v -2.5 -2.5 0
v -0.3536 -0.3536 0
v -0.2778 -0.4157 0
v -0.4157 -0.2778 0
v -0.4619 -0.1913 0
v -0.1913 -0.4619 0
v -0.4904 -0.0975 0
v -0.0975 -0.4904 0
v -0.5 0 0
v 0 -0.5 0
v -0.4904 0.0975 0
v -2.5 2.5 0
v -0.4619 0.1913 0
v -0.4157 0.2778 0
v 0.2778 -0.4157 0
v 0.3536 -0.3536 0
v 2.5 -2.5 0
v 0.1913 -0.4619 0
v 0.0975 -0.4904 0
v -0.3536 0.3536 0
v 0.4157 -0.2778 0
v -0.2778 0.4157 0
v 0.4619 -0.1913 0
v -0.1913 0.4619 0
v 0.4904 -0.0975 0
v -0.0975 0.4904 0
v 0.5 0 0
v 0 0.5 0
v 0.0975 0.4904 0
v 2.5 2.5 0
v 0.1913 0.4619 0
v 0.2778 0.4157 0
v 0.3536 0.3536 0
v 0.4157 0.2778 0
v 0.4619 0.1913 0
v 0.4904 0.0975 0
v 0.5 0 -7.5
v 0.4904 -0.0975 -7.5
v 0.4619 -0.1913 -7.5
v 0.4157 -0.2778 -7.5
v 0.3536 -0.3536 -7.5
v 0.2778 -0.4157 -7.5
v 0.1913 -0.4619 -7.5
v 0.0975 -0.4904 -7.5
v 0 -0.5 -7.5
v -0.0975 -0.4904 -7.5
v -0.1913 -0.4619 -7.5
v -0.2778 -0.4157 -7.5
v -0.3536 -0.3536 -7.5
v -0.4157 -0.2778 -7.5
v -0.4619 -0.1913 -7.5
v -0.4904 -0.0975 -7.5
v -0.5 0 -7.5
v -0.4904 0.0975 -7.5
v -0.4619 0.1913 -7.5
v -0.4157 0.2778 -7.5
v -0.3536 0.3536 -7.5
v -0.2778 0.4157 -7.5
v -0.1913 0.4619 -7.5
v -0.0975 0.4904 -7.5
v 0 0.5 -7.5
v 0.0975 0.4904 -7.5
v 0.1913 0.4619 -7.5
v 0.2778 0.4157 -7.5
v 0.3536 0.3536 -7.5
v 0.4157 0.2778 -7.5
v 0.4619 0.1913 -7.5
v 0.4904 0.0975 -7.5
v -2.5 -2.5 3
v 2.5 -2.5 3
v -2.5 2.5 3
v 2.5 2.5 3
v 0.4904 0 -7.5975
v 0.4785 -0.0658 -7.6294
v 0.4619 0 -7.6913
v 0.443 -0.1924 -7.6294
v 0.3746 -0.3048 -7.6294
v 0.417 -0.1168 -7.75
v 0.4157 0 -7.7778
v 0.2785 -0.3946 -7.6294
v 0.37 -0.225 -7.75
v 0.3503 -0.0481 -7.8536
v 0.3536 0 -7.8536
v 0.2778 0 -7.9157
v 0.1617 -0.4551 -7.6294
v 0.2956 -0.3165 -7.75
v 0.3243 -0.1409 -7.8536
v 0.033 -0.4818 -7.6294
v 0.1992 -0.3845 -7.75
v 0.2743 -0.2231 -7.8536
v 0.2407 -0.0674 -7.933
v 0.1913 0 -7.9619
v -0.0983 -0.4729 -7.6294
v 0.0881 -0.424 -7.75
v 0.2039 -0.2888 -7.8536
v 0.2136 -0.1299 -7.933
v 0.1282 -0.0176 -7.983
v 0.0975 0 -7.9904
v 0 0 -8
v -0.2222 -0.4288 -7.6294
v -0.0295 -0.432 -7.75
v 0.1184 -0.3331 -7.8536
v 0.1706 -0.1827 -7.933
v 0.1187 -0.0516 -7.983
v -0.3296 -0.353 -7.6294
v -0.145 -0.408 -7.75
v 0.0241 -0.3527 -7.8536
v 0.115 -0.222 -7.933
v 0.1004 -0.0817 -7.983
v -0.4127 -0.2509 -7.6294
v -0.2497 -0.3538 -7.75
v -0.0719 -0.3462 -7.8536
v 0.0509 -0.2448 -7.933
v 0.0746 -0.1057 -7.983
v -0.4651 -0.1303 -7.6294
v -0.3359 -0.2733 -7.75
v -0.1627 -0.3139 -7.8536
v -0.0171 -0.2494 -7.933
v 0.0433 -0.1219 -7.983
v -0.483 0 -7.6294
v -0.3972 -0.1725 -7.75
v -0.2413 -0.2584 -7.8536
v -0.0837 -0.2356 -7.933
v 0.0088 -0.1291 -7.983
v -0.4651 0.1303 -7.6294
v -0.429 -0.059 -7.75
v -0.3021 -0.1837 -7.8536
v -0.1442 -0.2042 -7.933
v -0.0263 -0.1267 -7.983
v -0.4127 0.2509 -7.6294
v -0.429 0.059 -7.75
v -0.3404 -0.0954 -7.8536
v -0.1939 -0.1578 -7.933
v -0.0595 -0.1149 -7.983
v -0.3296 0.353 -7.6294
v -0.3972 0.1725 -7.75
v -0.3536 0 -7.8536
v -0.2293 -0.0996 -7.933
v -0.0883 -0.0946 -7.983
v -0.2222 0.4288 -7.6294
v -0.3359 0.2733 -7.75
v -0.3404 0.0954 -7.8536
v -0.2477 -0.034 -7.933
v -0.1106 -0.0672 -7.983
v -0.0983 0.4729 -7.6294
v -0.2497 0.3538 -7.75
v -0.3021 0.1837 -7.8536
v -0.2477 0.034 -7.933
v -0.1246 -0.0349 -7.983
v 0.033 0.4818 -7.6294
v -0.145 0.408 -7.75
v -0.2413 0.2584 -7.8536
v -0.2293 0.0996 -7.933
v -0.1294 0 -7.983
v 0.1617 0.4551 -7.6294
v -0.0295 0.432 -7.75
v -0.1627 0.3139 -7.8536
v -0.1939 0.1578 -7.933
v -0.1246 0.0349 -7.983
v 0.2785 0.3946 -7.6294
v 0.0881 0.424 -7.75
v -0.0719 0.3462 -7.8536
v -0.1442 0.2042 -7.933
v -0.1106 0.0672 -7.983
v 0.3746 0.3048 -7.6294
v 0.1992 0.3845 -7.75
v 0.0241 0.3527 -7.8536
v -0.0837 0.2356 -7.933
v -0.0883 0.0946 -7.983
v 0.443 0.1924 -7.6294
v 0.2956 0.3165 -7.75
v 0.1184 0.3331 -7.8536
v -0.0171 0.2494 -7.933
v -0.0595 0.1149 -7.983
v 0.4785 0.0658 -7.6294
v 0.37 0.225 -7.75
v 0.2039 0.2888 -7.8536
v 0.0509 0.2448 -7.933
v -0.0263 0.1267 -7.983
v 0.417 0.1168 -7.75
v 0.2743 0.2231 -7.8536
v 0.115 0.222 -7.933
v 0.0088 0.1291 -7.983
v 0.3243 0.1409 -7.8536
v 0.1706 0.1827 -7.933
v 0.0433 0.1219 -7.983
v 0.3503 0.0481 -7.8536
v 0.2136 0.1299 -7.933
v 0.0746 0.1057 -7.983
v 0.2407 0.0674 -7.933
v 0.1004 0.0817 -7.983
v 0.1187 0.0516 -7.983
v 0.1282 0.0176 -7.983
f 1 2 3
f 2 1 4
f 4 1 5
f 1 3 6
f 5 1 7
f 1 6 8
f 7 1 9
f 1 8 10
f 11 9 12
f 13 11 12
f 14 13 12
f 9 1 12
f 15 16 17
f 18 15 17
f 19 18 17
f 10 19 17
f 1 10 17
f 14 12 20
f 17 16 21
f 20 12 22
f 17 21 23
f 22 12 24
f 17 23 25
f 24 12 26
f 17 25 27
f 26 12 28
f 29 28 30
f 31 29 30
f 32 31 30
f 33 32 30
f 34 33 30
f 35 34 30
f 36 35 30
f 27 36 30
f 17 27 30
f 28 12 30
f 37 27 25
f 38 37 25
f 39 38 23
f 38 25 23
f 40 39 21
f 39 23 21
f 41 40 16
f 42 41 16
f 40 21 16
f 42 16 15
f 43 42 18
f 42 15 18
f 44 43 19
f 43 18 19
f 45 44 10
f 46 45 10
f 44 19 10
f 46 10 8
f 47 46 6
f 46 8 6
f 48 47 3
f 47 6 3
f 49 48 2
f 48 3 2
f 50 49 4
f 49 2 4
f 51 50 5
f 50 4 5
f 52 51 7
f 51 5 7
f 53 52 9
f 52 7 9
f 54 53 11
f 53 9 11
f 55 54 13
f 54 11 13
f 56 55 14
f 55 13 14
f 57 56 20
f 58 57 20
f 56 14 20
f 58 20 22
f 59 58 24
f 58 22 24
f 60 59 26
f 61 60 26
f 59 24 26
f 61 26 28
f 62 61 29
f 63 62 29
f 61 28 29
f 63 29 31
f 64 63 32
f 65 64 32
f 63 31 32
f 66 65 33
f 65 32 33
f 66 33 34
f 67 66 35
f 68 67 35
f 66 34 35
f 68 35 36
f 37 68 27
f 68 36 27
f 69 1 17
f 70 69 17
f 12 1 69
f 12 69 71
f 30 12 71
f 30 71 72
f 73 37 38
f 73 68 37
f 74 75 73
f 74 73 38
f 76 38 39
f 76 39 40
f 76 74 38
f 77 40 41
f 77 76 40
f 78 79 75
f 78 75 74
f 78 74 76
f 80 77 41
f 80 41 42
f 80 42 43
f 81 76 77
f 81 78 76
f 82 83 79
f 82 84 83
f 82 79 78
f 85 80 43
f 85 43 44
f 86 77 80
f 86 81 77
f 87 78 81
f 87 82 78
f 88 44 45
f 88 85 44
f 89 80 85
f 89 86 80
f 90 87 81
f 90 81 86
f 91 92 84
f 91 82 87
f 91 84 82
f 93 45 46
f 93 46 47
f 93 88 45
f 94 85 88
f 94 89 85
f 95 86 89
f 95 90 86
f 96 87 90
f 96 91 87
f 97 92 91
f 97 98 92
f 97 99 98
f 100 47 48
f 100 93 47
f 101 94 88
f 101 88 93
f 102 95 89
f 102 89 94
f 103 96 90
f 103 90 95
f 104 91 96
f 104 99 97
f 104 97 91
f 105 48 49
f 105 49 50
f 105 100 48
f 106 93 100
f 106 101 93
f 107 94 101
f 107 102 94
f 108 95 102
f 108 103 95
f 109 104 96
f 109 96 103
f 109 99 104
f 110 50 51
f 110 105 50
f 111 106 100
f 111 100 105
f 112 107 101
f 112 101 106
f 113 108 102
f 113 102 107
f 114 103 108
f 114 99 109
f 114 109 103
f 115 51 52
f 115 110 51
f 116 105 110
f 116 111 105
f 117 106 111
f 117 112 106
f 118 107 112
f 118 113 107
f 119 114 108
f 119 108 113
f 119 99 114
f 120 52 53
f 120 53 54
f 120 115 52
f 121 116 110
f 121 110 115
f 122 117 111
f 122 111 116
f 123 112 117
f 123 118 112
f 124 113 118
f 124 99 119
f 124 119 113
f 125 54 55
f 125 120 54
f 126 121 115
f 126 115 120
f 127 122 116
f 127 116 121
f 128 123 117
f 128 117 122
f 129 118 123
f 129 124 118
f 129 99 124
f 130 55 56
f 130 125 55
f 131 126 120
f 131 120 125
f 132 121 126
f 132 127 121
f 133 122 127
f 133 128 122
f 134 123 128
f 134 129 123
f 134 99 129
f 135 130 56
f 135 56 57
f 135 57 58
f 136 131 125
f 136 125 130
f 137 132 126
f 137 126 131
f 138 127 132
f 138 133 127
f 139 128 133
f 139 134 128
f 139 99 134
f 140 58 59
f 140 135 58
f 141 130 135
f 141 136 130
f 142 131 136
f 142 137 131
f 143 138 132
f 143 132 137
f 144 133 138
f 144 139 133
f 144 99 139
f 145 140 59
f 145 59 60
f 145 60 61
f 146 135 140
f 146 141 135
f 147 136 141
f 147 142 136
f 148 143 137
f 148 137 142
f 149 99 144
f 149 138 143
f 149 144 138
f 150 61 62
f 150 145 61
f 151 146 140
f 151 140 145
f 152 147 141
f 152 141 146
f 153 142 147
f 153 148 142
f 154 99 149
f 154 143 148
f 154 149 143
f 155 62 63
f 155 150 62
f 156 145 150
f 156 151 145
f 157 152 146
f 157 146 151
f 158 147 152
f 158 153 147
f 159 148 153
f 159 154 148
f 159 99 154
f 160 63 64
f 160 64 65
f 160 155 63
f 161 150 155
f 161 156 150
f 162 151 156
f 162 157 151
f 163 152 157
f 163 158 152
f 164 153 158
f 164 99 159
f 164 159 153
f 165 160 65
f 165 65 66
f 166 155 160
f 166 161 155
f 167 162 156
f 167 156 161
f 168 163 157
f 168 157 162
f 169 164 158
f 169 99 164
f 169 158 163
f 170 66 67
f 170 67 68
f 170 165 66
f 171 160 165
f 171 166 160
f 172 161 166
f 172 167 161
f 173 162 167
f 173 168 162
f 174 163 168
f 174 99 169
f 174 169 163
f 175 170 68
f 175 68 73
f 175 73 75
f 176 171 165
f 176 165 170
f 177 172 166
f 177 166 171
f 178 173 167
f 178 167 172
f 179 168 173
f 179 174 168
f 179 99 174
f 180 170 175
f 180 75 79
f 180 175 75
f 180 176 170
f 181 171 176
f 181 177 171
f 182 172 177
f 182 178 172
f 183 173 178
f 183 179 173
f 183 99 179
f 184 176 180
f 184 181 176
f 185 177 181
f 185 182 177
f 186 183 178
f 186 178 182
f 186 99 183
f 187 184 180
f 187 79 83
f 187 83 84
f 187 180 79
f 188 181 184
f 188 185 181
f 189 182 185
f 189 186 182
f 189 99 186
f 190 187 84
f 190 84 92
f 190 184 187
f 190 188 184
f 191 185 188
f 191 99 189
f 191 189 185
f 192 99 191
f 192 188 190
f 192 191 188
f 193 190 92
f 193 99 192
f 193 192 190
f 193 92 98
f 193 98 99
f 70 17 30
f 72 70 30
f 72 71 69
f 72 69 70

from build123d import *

# Parameters (mm, degrees)
F0_W     = 5
F0_H     = 5
F1_DEPTH = 3
F2_R     = 0.5
F3_DEPTH = 8
F4_R     = 0.5


with BuildPart() as f1:
    # F0 (on Top) → F1 (new body)
    with BuildSketch(Plane.XY):
        Rectangle(F0_W, F0_H)
    extrude(amount=F1_DEPTH)

    # F2 (on face) → F3 (join)
    with BuildSketch(Plane(origin=(0, 0, 0), x_dir=(1, 0, 0), z_dir=(0, 0, -1))):
        Circle(F2_R)
    extrude(amount=F3_DEPTH)

    # F4
    f4_edges = [f1.edges().sort_by_distance(p)[0] for p in [
        (-0.5, 0, -8),
    ]]
    fillet(f4_edges, radius=F4_R)


solid = f1.part
